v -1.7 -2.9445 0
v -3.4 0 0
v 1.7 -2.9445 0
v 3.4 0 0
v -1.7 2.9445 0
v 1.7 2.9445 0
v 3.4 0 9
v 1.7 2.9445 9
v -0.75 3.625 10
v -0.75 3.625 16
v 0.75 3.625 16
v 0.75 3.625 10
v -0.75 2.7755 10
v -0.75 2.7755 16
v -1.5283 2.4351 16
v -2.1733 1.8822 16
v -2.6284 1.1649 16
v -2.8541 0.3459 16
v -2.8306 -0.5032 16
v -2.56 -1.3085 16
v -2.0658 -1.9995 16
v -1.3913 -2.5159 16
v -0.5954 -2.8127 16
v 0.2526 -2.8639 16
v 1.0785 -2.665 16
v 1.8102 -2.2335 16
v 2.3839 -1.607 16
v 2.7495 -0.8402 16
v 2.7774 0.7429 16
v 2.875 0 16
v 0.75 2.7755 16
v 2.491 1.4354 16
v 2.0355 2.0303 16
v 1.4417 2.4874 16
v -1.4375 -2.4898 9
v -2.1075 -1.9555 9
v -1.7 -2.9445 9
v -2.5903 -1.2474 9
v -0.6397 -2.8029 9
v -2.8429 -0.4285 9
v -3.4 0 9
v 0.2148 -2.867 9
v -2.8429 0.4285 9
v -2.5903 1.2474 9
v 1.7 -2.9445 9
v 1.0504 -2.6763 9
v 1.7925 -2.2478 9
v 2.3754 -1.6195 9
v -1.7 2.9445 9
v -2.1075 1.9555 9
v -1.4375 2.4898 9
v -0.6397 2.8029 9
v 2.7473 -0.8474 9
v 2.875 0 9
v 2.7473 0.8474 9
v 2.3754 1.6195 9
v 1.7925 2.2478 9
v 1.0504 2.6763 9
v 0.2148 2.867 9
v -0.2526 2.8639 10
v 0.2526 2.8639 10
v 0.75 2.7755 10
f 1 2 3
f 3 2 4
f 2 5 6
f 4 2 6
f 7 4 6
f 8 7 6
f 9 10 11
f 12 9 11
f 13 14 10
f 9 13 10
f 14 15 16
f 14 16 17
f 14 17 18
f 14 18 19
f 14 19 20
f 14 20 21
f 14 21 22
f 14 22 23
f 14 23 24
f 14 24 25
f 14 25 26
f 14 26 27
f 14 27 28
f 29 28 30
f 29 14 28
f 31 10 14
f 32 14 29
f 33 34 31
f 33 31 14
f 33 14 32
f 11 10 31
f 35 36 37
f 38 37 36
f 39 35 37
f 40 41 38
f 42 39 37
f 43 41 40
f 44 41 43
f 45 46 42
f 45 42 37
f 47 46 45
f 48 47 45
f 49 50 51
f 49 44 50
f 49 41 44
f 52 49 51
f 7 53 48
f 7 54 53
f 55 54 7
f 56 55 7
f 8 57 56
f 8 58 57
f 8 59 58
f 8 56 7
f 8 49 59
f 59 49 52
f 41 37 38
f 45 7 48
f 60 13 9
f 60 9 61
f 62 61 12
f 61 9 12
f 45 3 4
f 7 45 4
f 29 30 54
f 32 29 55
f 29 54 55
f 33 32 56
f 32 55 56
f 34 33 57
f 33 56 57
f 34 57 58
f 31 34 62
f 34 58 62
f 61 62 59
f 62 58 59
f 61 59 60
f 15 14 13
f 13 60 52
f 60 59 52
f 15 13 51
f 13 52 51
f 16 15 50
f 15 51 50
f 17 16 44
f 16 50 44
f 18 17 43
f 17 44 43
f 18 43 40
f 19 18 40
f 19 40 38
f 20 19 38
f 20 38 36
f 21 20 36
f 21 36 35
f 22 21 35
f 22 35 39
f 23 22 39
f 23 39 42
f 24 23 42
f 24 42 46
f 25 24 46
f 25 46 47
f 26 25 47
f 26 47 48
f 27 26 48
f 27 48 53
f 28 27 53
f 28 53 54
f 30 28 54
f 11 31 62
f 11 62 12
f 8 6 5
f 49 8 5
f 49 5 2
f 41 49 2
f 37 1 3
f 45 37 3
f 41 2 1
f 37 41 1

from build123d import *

# Parameters (mm, degrees)
BOSS_EXTRUDE1_DEPTH = 9
SKETCH2_R           = 2.875
BOSS_EXTRUDE2_DEPTH = 7
SKETCH3_W           = 1.5
SKETCH3_H           = 1.5
BOSS_EXTRUDE3_DEPTH = 6


with BuildPart() as part:
    # Sketch1 → Boss-Extrude1 (new body)
    with BuildSketch(Plane.XY):
        Polygon((3.4, 0), (1.7, 2.944486373), (-1.7, 2.944486373), (-3.4, 0), (-1.7, -2.944486373), (1.7, -2.944486373), align=None)
    extrude(amount=BOSS_EXTRUDE1_DEPTH)

    # Sketch2 → Boss-Extrude2 (add)
    with BuildSketch(Plane.XY.offset(9)):
        Circle(SKETCH2_R)
    extrude(amount=BOSS_EXTRUDE2_DEPTH)

    # Sketch3 → Boss-Extrude3 (add)
    with BuildSketch(Plane.XY.offset(16)):
        with Locations((0, 2.875)):
            Rectangle(SKETCH3_W, SKETCH3_H)
    extrude(amount=-BOSS_EXTRUDE3_DEPTH)


solid = part.part
